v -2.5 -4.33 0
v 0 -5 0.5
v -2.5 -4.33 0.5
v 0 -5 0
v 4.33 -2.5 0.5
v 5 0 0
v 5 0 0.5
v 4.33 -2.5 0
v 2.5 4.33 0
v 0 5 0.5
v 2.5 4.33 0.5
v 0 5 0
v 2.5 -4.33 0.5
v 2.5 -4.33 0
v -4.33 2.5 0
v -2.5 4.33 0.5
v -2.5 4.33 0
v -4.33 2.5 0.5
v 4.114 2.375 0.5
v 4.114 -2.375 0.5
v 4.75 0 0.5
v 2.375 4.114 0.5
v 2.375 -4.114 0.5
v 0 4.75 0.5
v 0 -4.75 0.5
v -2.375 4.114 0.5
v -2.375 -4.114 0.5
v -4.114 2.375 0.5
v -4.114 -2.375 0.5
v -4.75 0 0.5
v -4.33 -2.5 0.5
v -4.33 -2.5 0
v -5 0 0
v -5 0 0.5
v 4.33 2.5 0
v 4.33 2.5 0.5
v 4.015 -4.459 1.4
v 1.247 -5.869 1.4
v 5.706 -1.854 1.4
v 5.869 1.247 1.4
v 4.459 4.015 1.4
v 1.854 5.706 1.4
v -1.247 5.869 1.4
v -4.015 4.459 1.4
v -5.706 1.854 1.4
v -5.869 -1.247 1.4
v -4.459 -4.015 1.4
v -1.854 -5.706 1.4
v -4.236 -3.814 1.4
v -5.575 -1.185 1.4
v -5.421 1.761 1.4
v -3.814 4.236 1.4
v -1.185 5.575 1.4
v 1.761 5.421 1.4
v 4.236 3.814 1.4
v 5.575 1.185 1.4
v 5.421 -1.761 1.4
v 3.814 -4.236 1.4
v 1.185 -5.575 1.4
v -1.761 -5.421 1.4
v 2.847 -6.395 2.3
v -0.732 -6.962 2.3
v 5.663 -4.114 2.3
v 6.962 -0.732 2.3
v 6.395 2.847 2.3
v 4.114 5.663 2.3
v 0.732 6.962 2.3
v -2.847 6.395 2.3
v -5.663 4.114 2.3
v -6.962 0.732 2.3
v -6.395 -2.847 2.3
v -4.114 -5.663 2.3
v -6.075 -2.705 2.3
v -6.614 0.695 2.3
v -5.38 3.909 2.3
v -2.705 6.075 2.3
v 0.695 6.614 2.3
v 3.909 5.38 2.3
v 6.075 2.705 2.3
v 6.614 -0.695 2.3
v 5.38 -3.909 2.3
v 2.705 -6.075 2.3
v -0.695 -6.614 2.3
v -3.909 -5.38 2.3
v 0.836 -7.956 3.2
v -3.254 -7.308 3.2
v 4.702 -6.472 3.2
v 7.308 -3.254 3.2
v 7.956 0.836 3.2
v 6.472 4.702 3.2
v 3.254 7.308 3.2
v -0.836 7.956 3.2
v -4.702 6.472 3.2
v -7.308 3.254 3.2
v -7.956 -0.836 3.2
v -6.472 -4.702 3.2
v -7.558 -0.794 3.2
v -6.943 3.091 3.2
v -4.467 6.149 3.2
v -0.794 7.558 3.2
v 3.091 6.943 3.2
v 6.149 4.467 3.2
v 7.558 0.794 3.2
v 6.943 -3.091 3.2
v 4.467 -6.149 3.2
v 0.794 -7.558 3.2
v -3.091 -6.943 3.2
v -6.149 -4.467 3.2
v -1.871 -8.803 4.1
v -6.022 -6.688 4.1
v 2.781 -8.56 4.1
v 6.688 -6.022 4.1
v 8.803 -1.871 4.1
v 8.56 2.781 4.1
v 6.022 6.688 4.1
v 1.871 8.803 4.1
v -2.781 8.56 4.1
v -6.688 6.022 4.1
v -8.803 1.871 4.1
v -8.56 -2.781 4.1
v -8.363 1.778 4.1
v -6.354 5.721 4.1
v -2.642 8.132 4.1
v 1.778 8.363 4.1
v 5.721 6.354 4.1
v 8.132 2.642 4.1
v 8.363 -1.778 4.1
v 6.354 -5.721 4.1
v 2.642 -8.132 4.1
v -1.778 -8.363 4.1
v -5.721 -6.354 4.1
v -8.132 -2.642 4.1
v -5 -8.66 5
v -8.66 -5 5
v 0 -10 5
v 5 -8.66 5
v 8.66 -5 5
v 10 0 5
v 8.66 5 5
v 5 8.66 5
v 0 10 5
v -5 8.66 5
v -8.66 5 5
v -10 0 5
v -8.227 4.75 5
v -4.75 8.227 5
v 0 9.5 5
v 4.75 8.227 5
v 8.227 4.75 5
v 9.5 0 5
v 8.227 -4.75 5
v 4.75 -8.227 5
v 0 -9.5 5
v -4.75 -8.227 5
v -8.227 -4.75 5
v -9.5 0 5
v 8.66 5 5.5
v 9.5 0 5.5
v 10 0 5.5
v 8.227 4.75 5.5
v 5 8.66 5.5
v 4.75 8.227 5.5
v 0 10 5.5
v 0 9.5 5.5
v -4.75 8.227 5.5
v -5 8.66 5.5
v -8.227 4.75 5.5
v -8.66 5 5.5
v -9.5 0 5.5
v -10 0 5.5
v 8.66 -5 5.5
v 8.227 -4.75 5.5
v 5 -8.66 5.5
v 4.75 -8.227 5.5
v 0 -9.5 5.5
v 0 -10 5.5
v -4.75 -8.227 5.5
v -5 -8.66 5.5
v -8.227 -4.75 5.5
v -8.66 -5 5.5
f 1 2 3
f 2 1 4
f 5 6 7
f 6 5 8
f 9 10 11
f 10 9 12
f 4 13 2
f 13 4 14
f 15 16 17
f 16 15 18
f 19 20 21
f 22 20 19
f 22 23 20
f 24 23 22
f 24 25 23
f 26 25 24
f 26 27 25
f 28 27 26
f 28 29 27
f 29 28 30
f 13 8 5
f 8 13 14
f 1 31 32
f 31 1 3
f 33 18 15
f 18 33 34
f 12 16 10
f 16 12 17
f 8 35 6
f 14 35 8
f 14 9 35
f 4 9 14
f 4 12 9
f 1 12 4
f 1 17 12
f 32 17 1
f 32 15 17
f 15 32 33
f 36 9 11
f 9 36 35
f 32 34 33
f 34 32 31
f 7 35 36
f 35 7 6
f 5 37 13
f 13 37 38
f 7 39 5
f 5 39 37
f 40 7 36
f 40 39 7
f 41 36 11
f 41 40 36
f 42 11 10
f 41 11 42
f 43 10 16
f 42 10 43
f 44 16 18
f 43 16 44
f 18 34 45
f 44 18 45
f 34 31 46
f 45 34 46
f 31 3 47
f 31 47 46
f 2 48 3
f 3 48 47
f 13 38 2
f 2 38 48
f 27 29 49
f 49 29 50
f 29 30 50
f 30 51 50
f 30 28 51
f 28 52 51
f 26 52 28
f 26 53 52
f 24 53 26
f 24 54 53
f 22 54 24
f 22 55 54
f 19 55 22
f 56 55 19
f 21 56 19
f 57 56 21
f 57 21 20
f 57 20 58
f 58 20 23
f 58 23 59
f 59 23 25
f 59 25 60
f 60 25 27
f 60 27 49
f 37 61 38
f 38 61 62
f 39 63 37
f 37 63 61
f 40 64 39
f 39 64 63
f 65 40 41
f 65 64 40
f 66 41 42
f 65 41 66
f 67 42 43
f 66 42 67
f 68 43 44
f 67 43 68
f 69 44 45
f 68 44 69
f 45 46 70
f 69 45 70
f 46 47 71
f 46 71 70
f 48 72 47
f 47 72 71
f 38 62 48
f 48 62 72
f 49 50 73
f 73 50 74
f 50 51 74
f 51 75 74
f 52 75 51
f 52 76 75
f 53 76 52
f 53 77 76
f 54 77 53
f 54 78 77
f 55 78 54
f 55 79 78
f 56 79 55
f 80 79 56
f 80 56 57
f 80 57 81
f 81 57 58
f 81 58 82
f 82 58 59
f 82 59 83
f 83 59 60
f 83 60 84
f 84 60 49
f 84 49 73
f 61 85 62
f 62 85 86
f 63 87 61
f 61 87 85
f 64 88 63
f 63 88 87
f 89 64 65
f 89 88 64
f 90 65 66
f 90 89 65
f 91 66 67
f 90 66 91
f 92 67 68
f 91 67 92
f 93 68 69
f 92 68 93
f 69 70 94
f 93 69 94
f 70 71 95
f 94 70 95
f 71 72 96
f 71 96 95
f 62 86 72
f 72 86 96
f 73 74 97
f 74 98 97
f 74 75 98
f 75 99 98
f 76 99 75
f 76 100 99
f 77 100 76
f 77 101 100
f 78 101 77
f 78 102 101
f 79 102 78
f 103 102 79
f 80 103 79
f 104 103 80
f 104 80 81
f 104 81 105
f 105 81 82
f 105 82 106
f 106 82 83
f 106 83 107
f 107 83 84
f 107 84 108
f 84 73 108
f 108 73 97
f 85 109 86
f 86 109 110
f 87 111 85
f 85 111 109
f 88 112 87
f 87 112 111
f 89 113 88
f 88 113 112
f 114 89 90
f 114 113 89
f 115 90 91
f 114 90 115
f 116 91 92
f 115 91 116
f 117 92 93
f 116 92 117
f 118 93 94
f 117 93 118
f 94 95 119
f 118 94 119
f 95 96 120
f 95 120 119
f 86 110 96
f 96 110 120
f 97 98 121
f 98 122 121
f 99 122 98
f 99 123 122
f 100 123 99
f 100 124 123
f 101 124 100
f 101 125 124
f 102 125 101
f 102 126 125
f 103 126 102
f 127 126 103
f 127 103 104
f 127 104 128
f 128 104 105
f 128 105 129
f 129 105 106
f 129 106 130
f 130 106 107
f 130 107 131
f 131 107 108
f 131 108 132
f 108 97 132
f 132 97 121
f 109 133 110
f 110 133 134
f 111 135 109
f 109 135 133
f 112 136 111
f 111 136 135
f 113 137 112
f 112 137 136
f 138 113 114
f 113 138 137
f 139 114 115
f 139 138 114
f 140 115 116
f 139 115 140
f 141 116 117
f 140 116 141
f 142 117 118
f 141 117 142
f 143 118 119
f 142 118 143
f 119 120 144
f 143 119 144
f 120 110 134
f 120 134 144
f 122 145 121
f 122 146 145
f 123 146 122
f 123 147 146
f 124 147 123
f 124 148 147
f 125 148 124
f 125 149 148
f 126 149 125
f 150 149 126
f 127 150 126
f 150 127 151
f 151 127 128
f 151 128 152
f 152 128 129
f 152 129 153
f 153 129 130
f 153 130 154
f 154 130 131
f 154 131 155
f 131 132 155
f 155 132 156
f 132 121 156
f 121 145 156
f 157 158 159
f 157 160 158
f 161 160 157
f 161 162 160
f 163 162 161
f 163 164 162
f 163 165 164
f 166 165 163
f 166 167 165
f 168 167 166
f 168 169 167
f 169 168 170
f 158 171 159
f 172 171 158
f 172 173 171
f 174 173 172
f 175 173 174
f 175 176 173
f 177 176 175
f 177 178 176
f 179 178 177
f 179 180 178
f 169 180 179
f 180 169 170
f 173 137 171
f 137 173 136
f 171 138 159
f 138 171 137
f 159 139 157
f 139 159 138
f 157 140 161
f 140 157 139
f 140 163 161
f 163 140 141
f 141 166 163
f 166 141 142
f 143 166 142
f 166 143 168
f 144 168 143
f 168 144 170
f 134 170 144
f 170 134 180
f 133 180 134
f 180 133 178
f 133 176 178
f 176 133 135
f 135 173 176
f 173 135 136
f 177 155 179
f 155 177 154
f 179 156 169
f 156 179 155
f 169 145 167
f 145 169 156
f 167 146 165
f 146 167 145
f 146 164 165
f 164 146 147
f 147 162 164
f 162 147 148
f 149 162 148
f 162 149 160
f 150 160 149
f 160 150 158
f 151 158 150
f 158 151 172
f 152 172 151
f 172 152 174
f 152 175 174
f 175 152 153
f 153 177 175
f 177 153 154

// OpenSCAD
module geometric_planter(height, width, wall_thickness=0.5, sides=4, base_thickness, scale=1) {
	echo(base_thickness);
	base_thickness = base_thickness == undef ? wall_thickness : base_thickness;

	//Draws base layer
	linear_extrude(height=base_thickness) {
		difference() {
			circle(d=width, $fn=sides);
		}
	}
	
	//Draws twist
	translate([0,0,base_thickness]) {
		linear_extrude(height=height-wall_thickness, twist=90, slices=5, scale=scale) {
			difference() {
				circle(d=width, $fn=sides);
				circle(d=width-wall_thickness, $fn=sides);

			}
		}
	}
	
	translate([0,0,height]) {
		linear_extrude(height=base_thickness) {
			difference() {
				circle(d=width*scale, $fn=sides);
				circle(d=width*scale-wall_thickness*2, $fn=sides);
			}
		}
	}
}

geometric_planter(5, 10, sides=12, wall_thickness=0.5, base_thickness=0.5,
		scale=2);
